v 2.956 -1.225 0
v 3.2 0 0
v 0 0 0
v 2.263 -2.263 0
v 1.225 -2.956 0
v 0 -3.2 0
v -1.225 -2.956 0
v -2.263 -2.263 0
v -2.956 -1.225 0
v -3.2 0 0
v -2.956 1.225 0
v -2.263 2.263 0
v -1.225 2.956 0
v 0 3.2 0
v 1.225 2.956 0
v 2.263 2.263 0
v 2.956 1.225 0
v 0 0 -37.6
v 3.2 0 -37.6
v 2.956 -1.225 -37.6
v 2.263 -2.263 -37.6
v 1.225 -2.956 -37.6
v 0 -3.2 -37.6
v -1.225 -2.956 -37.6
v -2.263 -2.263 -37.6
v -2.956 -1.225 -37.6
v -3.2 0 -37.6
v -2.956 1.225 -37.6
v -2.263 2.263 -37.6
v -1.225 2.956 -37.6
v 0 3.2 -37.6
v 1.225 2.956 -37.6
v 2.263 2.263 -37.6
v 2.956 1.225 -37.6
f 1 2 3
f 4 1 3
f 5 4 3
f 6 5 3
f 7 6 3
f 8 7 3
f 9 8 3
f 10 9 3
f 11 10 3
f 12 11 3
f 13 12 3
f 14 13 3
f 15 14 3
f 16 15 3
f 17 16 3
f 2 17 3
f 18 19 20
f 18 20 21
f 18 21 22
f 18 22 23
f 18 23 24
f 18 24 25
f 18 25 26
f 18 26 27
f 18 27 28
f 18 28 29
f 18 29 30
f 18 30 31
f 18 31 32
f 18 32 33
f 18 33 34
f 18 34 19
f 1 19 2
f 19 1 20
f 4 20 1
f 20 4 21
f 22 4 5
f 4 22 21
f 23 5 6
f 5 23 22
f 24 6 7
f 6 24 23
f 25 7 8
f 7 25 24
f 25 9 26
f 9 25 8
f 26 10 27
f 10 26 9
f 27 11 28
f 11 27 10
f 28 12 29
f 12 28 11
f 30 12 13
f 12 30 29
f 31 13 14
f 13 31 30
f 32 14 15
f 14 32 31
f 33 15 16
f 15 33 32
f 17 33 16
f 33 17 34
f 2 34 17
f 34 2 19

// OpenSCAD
// file: ../p/stud3.scad
use <../lib.scad>
use <4-4cyli.scad>
use <4-4disc.scad>
use <4-4edge.scad>
$fa=1; $fs=0.2;
function ldraw_lib__stud3(realsolid=false) = realsolid ? 
    [openscad(translate([0,0,-eps()], o=cylinder(4+eps(), r=4)),2)] : [
// 0 Stud Tube Solid
// 0 Name: stud3.dat
// 0 Author: James Jessiman
// 0 !LDRAW_ORG Primitive UPDATE 2012-01
// 0 !LICENSE Licensed under CC BY 2.0 and CC BY 4.0 : see CAreadme.txt
// 
// 0 BFC CERTIFY CCW
  [0,"BFC","CERTIFY"],
  [0,"BFC","CCW"],
// 
// 0 !HISTORY 2002-04-04 [sbliss] Modified for BFC compliance
// 0 !HISTORY 2002-04-25 [PTadmin] Official Update 2002-02
// 0 !HISTORY 2007-06-24 [PTadmin] Header formatted for Contributor Agreement
// 0 !HISTORY 2008-07-01 [PTadmin] Official Update 2008-01
// 0 !HISTORY 2012-02-16 [Philo] Changed to CCW
// 0 !HISTORY 2012-03-30 [PTadmin] Official Update 2012-01
// 
// 
// 1 16 0 -4 0 4 0 0 0 1 0 0 0 4 4-4edge.dat
  [1,16,0,-4,0,4,0,0,0,1,0,0,0,4, ldraw_lib__4_4edge(realsolid)],
// 1 16 0 0 0 4 0 0 0 1 0 0 0 4 4-4edge.dat
  [1,16,0,0,0,4,0,0,0,1,0,0,0,4, ldraw_lib__4_4edge(realsolid)],
// 1 16 0 -4 0 4 0 0 0 1 0 0 0 4 4-4disc.dat
  [1,16,0,-4,0,4,0,0,0,1,0,0,0,4, ldraw_lib__4_4disc(realsolid)],
// 1 16 0 -4 0 4 0 0 0 4 0 0 0 4 4-4cyli.dat
  [1,16,0,-4,0,4,0,0,0,4,0,0,0,4, ldraw_lib__4_4cyli(realsolid)],
];
module ldraw_lib__stud3(step=0, col=false, unit=2/5, alt=false, line=0.2, solid=!$preview)
    makepoly(ldraw_lib__stud3(solid), step=step, col=col, unit=unit, alt=alt, line=line, solid=solid);
ldraw_lib__stud3(line=0.2);
// file: ../p/stud.scad
use <../lib.scad>
use <4-4cyli.scad>
use <4-4disc.scad>
use <4-4edge.scad>
$fa=1; $fs=0.2;
function ldraw_lib__stud(realsolid=false) = realsolid ? 
    [openscad(translate([0,0,-eps()], o=cylinder(4+eps(), r=6)),2)] : [
// 0 Stud
// 0 Name: stud.dat
// 0 Author: James Jessiman
// 0 !LDRAW_ORG Primitive UPDATE 2012-01
// 0 !LICENSE Licensed under CC BY 2.0 and CC BY 4.0 : see CAreadme.txt
// 
// 0 BFC CERTIFY CCW
  [0,"BFC","CERTIFY"],
  [0,"BFC","CCW"],
// 
// 0 !HISTORY 2002-04-04 [sbliss] Modified for BFC compliance
// 0 !HISTORY 2002-04-25 [PTadmin] Official Update 2002-02
// 0 !HISTORY 2007-06-24 [PTadmin] Header formatted for Contributor Agreement
// 0 !HISTORY 2008-07-01 [PTadmin] Official Update 2008-01
// 0 !HISTORY 2012-02-16 [Philo] Changed to CCW
// 0 !HISTORY 2012-03-30 [PTadmin] Official Update 2012-01
// 
// 
// 1 16 0 0 0 6 0 0 0 1 0 0 0 6 4-4edge.dat
  [1,16,0,0,0,6,0,0,0,1,0,0,0,6, ldraw_lib__4_4edge(realsolid)],
// 1 16 0 -4 0 6 0 0 0 1 0 0 0 6 4-4edge.dat
  [1,16,0,-4,0,6,0,0,0,1,0,0,0,6, ldraw_lib__4_4edge(realsolid)],
// 1 16 0 0 0 6 0 0 0 -4 0 0 0 6 4-4cyli.dat
  [1,16,0,0,0,6,0,0,0,-4,0,0,0,6, ldraw_lib__4_4cyli(realsolid)],
// 1 16 0 -4 0 6 0 0 0 1 0 0 0 6 4-4disc.dat
  [1,16,0,-4,0,6,0,0,0,1,0,0,0,6, ldraw_lib__4_4disc(realsolid)],
];
module ldraw_lib__stud(step=0, col=false, unit=2/5, alt=false, line=0.2, solid=!$preview)
    makepoly(ldraw_lib__stud(solid), step=step, col=col, unit=unit, alt=alt, line=line, solid=solid);
ldraw_lib__stud(line=0.2);
// file: ../p/box5.scad
use <../lib.scad>
$fa=1; $fs=0.2;
function ldraw_lib__box5(realsolid=false) = [
// 0 Box with 5 Faces and All Edges
// 0 Name: box5.dat
// 0 Author: James Jessiman
// 0 !LDRAW_ORG Primitive UPDATE 2012-01
// 0 !LICENSE Licensed under CC BY 2.0 and CC BY 4.0 : see CAreadme.txt
// 
// 0 BFC CERTIFY CCW
  [0,"BFC","CERTIFY"],
  [0,"BFC","CCW"],
// 
// 0 !HISTORY 2002-04-03 [sbliss] Modified for BFC compliance
// 0 !HISTORY 2002-04-25 [PTadmin] Official Update 2002-02
// 0 !HISTORY 2007-06-24 [PTadmin] Header formatted for Contributor Agreement
// 0 !HISTORY 2008-07-01 [PTadmin] Official Update 2008-01
// 0 !HISTORY 2012-02-16 [Philo] Changed to CCW
// 0 !HISTORY 2012-03-30 [PTadmin] Official Update 2012-01
// 
// 
// 2 24 1 1 1 -1 1 1
  [2,24,1,1,1,-1,1,1],
// 2 24 -1 1 1 -1 1 -1
  [2,24,-1,1,1,-1,1,-1],
// 2 24 -1 1 -1 1 1 -1
  [2,24,-1,1,-1,1,1,-1],
// 2 24 1 1 -1 1 1 1
  [2,24,1,1,-1,1,1,1],
// 2 24 1 0 1 -1 0 1
  [2,24,1,0,1,-1,0,1],
// 2 24 -1 0 1 -1 0 -1
  [2,24,-1,0,1,-1,0,-1],
// 2 24 -1 0 -1 1 0 -1
  [2,24,-1,0,-1,1,0,-1],
// 2 24 1 0 -1 1 0 1
  [2,24,1,0,-1,1,0,1],
// 2 24 1 0 1 1 1 1
  [2,24,1,0,1,1,1,1],
// 2 24 -1 0 1 -1 1 1
  [2,24,-1,0,1,-1,1,1],
// 2 24 1 0 -1 1 1 -1
  [2,24,1,0,-1,1,1,-1],
// 2 24 -1 0 -1 -1 1 -1
  [2,24,-1,0,-1,-1,1,-1],
// 4 16 -1 1 1 1 1 1 1 1 -1 -1 1 -1
  [4,16,-1,1,1,1,1,1,1,1,-1,-1,1,-1],
// 4 16 -1 1 1 -1 0 1 1 0 1 1 1 1
  [4,16,-1,1,1,-1,0,1,1,0,1,1,1,1],
// 4 16 -1 1 -1 -1 0 -1 -1 0 1 -1 1 1
  [4,16,-1,1,-1,-1,0,-1,-1,0,1,-1,1,1],
// 4 16 1 1 -1 1 0 -1 -1 0 -1 -1 1 -1
  [4,16,1,1,-1,1,0,-1,-1,0,-1,-1,1,-1],
// 4 16 1 1 1 1 0 1 1 0 -1 1 1 -1
  [4,16,1,1,1,1,0,1,1,0,-1,1,1,-1],
];
module ldraw_lib__box5(step=0, col=false, unit=2/5, alt=false, line=0.2, solid=!$preview)
    makepoly(ldraw_lib__box5(solid), step=step, col=col, unit=unit, alt=alt, line=line, solid=solid);
ldraw_lib__box5(line=0.2);
// file: ../p/box4t.scad
use <../lib.scad>
$fa=1; $fs=0.2;
function ldraw_lib__box4t(realsolid=false) = [
// 0 Box with 4 Adjacent Faces and All Edges
// 0 Name: box4t.dat
// 0 Author: Tore Eriksson [Tore_Eriksson]
// 0 !LDRAW_ORG Primitive UPDATE 2003-02
// 0 !LICENSE Licensed under CC BY 2.0 and CC BY 4.0 : see CAreadme.txt
// 
// 0 BFC CERTIFY CCW
  [0,"BFC","CERTIFY"],
  [0,"BFC","CCW"],
// 
// 0 !HISTORY 1997-09-29 [PTadmin] Official Update 1997-15
// 0 !HISTORY 2002-08-31 [izanette] Modified with WINDZ for BFC compliance
// 0 !HISTORY 2003-08-01 [PTadmin] Official Update 2003-02
// 0 !HISTORY 2007-06-24 [PTadmin] Header formatted for Contributor Agreement
// 0 !HISTORY 2008-07-01 [PTadmin] Official Update 2008-01
// 
// 
// 2 24 1 1 1 -1 1 1
  [2,24,1,1,1,-1,1,1],
// 2 24 -1 1 1 -1 1 -1
  [2,24,-1,1,1,-1,1,-1],
// 2 24 -1 1 -1 1 1 -1
  [2,24,-1,1,-1,1,1,-1],
// 2 24 1 1 -1 1 1 1
  [2,24,1,1,-1,1,1,1],
// 2 24 1 0 1 -1 0 1
  [2,24,1,0,1,-1,0,1],
// 2 24 -1 0 1 -1 0 -1
  [2,24,-1,0,1,-1,0,-1],
// 2 24 -1 0 -1 1 0 -1
  [2,24,-1,0,-1,1,0,-1],
// 2 24 1 0 -1 1 0 1
  [2,24,1,0,-1,1,0,1],
// 2 24 1 0 1 1 1 1
  [2,24,1,0,1,1,1,1],
// 2 24 -1 0 1 -1 1 1
  [2,24,-1,0,1,-1,1,1],
// 2 24 1 0 -1 1 1 -1
  [2,24,1,0,-1,1,1,-1],
// 2 24 -1 0 -1 -1 1 -1
  [2,24,-1,0,-1,-1,1,-1],
// 4 16 1 1 1 1 1 -1 -1 1 -1 -1 1 1
  [4,16,1,1,1,1,1,-1,-1,1,-1,-1,1,1],
// 4 16 1 1 1 -1 1 1 -1 0 1 1 0 1
  [4,16,1,1,1,-1,1,1,-1,0,1,1,0,1],
// 4 16 -1 1 1 -1 1 -1 -1 0 -1 -1 0 1
  [4,16,-1,1,1,-1,1,-1,-1,0,-1,-1,0,1],
// 0 4 16 -1 1 -1 -1 0 -1 1 0 -1 1 1 -1
// 4 16 1 1 -1 1 1 1 1 0 1 1 0 -1
  [4,16,1,1,-1,1,1,1,1,0,1,1,0,-1],
// 0
];
module ldraw_lib__box4t(step=0, col=false, unit=2/5, alt=false, line=0.2, solid=!$preview)
    makepoly(ldraw_lib__box4t(solid), step=step, col=col, unit=unit, alt=alt, line=line, solid=solid);
ldraw_lib__box4t(line=0.2);
// file: s/3004s01.scad
use <../../lib.scad>
use <../../p/box4t.scad>
use <../../p/box5.scad>
use <../../p/stud.scad>
use <../../p/stud3.scad>
$fa=1; $fs=0.2;
function ldraw_lib__s__3004s01(realsolid=false) = [
// 0 ~Brick  1 x  2 without Front Face
// 0 Name: s\3004s01.dat
// 0 Author: James Jessiman
// 0 !LDRAW_ORG Subpart UPDATE 2003-03
// 0 !LICENSE Licensed under CC BY 2.0 and CC BY 4.0 : see CAreadme.txt
// 
// 0 BFC CERTIFY CCW
  [0,"BFC","CERTIFY"],
  [0,"BFC","CCW"],
// 
// 0 !HISTORY 2003-09-07 [jriley] Subfiling, BFC
// 0 !HISTORY 2003-12-19 [PTadmin] Official Update 2003-03
// 0 !HISTORY 2007-08-29 [PTadmin] Header formatted for Contributor Agreement
// 0 !HISTORY 2008-07-01 [PTadmin] Official Update 2008-01
// 
// 
// 1 16 0 4 0 1 0 0 0 -5 0 0 0 1 stud3.dat
  [1,16,0,4,0,1,0,0,0,-5,0,0,0,1, ldraw_lib__stud3(realsolid)],
// 0 BFC INVERTNEXT
  [0,"BFC","INVERTNEXT"],
// 1 16 0 24 0 16 0 0 0 -20 0 0 0 6 box5.dat
  [1,16,0,24,0,16,0,0,0,-20,0,0,0,6, ldraw_lib__box5(realsolid)],
// 4 16 20 24 10 16 24 6 -16 24 6 -20 24 10
  [4,16,20,24,10,16,24,6,-16,24,6,-20,24,10],
// 4 16 -20 24 10 -16 24 6 -16 24 -6 -20 24 -10
  [4,16,-20,24,10,-16,24,6,-16,24,-6,-20,24,-10],
// 4 16 -20 24 -10 -16 24 -6 16 24 -6 20 24 -10
  [4,16,-20,24,-10,-16,24,-6,16,24,-6,20,24,-10],
// 4 16 20 24 -10 16 24 -6 16 24 6 20 24 10
  [4,16,20,24,-10,16,24,-6,16,24,6,20,24,10],
// 1 16 0 24 0 20 0 0 0 -24 0 0 0 10 box4t.dat
  [1,16,0,24,0,20,0,0,0,-24,0,0,0,10, ldraw_lib__box4t(realsolid)],
// 1 16 10 0 0 1 0 0 0 1 0 0 0 1 stud.dat
  [1,16,10,0,0,1,0,0,0,1,0,0,0,1, ldraw_lib__stud(realsolid)],
// 1 16 -10 0 0 1 0 0 0 1 0 0 0 1 stud.dat
  [1,16,-10,0,0,1,0,0,0,1,0,0,0,1, ldraw_lib__stud(realsolid)],
// 0
];
module ldraw_lib__s__3004s01(step=0, col=false, unit=2/5, alt=false, line=0.2, solid=!$preview)
    makepoly(ldraw_lib__s__3004s01(solid), step=step, col=col, unit=unit, alt=alt, line=line, solid=solid);
ldraw_lib__s__3004s01(line=0.2);
// file: ../p/4-4cyli.scad
use <../lib.scad>
$fa=1; $fs=0.2;
function ldraw_lib__4_4cyli(realsolid=false) = [
// 0 Cylinder 1.0
// 0 Name: 4-4cyli.dat
// 0 Author: James Jessiman
// 0 !LDRAW_ORG Primitive UPDATE 2005-01
// 0 !LICENSE Licensed under CC BY 2.0 and CC BY 4.0 : see CAreadme.txt
// 
// 0 BFC CERTIFY CCW
  [0,"BFC","CERTIFY"],
  [0,"BFC","CCW"],
// 
// 0 !HISTORY 1998-12-15 [PTadmin] Official Update 1998-10
// 0 !HISTORY 2002-03-23 [sbliss] Added BFC statement; merged headers from files in distributions LDraw 0.27 and Complete.
// 0 !HISTORY 2002-04-25 [PTadmin] Official Update 2002-02
// 0 !HISTORY 2004-12-14 [guyvivan] BFC CCW
// 0 !HISTORY 2005-12-28 [PTadmin] Official Update 2005-01
// 0 !HISTORY 2007-06-24 [PTadmin] Header formatted for Contributor Agreement
// 0 !HISTORY 2008-07-01 [PTadmin] Official Update 2008-01
// 
// 
// 4 16 1 1 0 0.9239 1 0.3827 0.9239 0 0.3827 1 0 0
  [4,16,1,1,0,0.9239,1,0.3827,0.9239,0,0.3827,1,0,0],
// 5 24 1 0 0 1 1 0 0.9239 0 0.3827 0.9239 0 -0.3827
  [5,24,1,0,0,1,1,0,0.9239,0,0.3827,0.9239,0,-0.3827],
// 4 16 0.9239 1 0.3827 0.7071 1 0.7071 0.7071 0 0.7071 0.9239 0 0.3827
  [4,16,0.9239,1,0.3827,0.7071,1,0.7071,0.7071,0,0.7071,0.9239,0,0.3827],
// 5 24 0.9239 0 0.3827 0.9239 1 0.3827 0.7071 0 0.7071 1 0 0
  [5,24,0.9239,0,0.3827,0.9239,1,0.3827,0.7071,0,0.7071,1,0,0],
// 4 16 0.7071 1 0.7071 0.3827 1 0.9239 0.3827 0 0.9239 0.7071 0 0.7071
  [4,16,0.7071,1,0.7071,0.3827,1,0.9239,0.3827,0,0.9239,0.7071,0,0.7071],
// 5 24 0.7071 0 0.7071 0.7071 1 0.7071 0.3827 0 0.9239 0.9239 0 0.3827
  [5,24,0.7071,0,0.7071,0.7071,1,0.7071,0.3827,0,0.9239,0.9239,0,0.3827],
// 4 16 0.3827 1 0.9239 0 1 1 0 0 1 0.3827 0 0.9239
  [4,16,0.3827,1,0.9239,0,1,1,0,0,1,0.3827,0,0.9239],
// 5 24 0.3827 0 0.9239 0.3827 1 0.9239 0 0 1 0.7071 0 0.7071
  [5,24,0.3827,0,0.9239,0.3827,1,0.9239,0,0,1,0.7071,0,0.7071],
// 4 16 0 1 1 -0.3827 1 0.9239 -0.3827 0 0.9239 0 0 1
  [4,16,0,1,1,-0.3827,1,0.9239,-0.3827,0,0.9239,0,0,1],
// 5 24 0 0 1 0 1 1 -0.3827 0 0.9239 0.3827 0 0.9239
  [5,24,0,0,1,0,1,1,-0.3827,0,0.9239,0.3827,0,0.9239],
// 4 16 -0.3827 1 0.9239 -0.7071 1 0.7071 -0.7071 0 0.7071 -0.3827 0 0.9239
  [4,16,-0.3827,1,0.9239,-0.7071,1,0.7071,-0.7071,0,0.7071,-0.3827,0,0.9239],
// 5 24 -0.3827 0 0.9239 -0.3827 1 0.9239 -0.7071 0 0.7071 0 0 1
  [5,24,-0.3827,0,0.9239,-0.3827,1,0.9239,-0.7071,0,0.7071,0,0,1],
// 4 16 -0.7071 1 0.7071 -0.9239 1 0.3827 -0.9239 0 0.3827 -0.7071 0 0.7071
  [4,16,-0.7071,1,0.7071,-0.9239,1,0.3827,-0.9239,0,0.3827,-0.7071,0,0.7071],
// 5 24 -0.7071 0 0.7071 -0.7071 1 0.7071 -0.9239 0 0.3827 -0.3827 0 0.9239
  [5,24,-0.7071,0,0.7071,-0.7071,1,0.7071,-0.9239,0,0.3827,-0.3827,0,0.9239],
// 4 16 -0.9239 1 0.3827 -1 1 0 -1 0 0 -0.9239 0 0.3827
  [4,16,-0.9239,1,0.3827,-1,1,0,-1,0,0,-0.9239,0,0.3827],
// 5 24 -0.9239 0 0.3827 -0.9239 1 0.3827 -1 0 0 -0.7071 0 0.7071
  [5,24,-0.9239,0,0.3827,-0.9239,1,0.3827,-1,0,0,-0.7071,0,0.7071],
// 4 16 -1 1 0 -0.9239 1 -0.3827 -0.9239 0 -0.3827 -1 0 0
  [4,16,-1,1,0,-0.9239,1,-0.3827,-0.9239,0,-0.3827,-1,0,0],
// 5 24 -1 0 0 -1 1 0 -0.9239 0 -0.3827 -0.9239 0 0.3827
  [5,24,-1,0,0,-1,1,0,-0.9239,0,-0.3827,-0.9239,0,0.3827],
// 4 16 -0.9239 1 -0.3827 -0.7071 1 -0.7071 -0.7071 0 -0.7071 -0.9239 0 -0.3827
  [4,16,-0.9239,1,-0.3827,-0.7071,1,-0.7071,-0.7071,0,-0.7071,-0.9239,0,-0.3827],
// 5 24 -0.9239 0 -0.3827 -0.9239 1 -0.3827 -0.7071 0 -0.7071 -1 0 0
  [5,24,-0.9239,0,-0.3827,-0.9239,1,-0.3827,-0.7071,0,-0.7071,-1,0,0],
// 4 16 -0.7071 1 -0.7071 -0.3827 1 -0.9239 -0.3827 0 -0.9239 -0.7071 0 -0.7071
  [4,16,-0.7071,1,-0.7071,-0.3827,1,-0.9239,-0.3827,0,-0.9239,-0.7071,0,-0.7071],
// 5 24 -0.7071 0 -0.7071 -0.7071 1 -0.7071 -0.3827 0 -0.9239 -0.9239 0 -0.3827
  [5,24,-0.7071,0,-0.7071,-0.7071,1,-0.7071,-0.3827,0,-0.9239,-0.9239,0,-0.3827],
// 4 16 -0.3827 1 -0.9239 0 1 -1 0 0 -1 -0.3827 0 -0.9239
  [4,16,-0.3827,1,-0.9239,0,1,-1,0,0,-1,-0.3827,0,-0.9239],
// 5 24 -0.3827 0 -0.9239 -0.3827 1 -0.9239 0 0 -1 -0.7071 0 -0.7071
  [5,24,-0.3827,0,-0.9239,-0.3827,1,-0.9239,0,0,-1,-0.7071,0,-0.7071],
// 4 16 0 1 -1 0.3827 1 -0.9239 0.3827 0 -0.9239 0 0 -1
  [4,16,0,1,-1,0.3827,1,-0.9239,0.3827,0,-0.9239,0,0,-1],
// 5 24 0 0 -1 0 1 -1 0.3827 0 -0.9239 -0.3827 0 -0.9239
  [5,24,0,0,-1,0,1,-1,0.3827,0,-0.9239,-0.3827,0,-0.9239],
// 4 16 0.3827 1 -0.9239 0.7071 1 -0.7071 0.7071 0 -0.7071 0.3827 0 -0.9239
  [4,16,0.3827,1,-0.9239,0.7071,1,-0.7071,0.7071,0,-0.7071,0.3827,0,-0.9239],
// 5 24 0.3827 0 -0.9239 0.3827 1 -0.9239 0.7071 0 -0.7071 0 0 -1
  [5,24,0.3827,0,-0.9239,0.3827,1,-0.9239,0.7071,0,-0.7071,0,0,-1],
// 4 16 0.7071 1 -0.7071 0.9239 1 -0.3827 0.9239 0 -0.3827 0.7071 0 -0.7071
  [4,16,0.7071,1,-0.7071,0.9239,1,-0.3827,0.9239,0,-0.3827,0.7071,0,-0.7071],
// 5 24 0.7071 0 -0.7071 0.7071 1 -0.7071 0.9239 0 -0.3827 0.3827 0 -0.9239
  [5,24,0.7071,0,-0.7071,0.7071,1,-0.7071,0.9239,0,-0.3827,0.3827,0,-0.9239],
// 4 16 0.9239 1 -0.3827 1 1 0 1 0 0 0.9239 0 -0.3827
  [4,16,0.9239,1,-0.3827,1,1,0,1,0,0,0.9239,0,-0.3827],
// 5 24 0.9239 0 -0.3827 0.9239 1 -0.3827 1 0 0 0.7071 0 -0.7071
  [5,24,0.9239,0,-0.3827,0.9239,1,-0.3827,1,0,0,0.7071,0,-0.7071],
// 0
];
module ldraw_lib__4_4cyli(step=0, col=false, unit=2/5, alt=false, line=0.2, solid=!$preview)
    makepoly(ldraw_lib__4_4cyli(solid), step=step, col=col, unit=unit, alt=alt, line=line, solid=solid);
ldraw_lib__4_4cyli(line=0.2);
// file: 3004.scad
use <../lib.scad>
use <s/3004s01.scad>
$fa=1; $fs=0.2;
function ldraw_lib__3004(realsolid=false) = [
// 0 Brick  1 x  2
// 0 Name: 3004.dat
// 0 Author: James Jessiman
// 0 !LDRAW_ORG Part UPDATE 2022-05
// 0 !LICENSE Licensed under CC BY 2.0 and CC BY 4.0 : see CAreadme.txt
// 
// 0 BFC CERTIFY CCW
  [0,"BFC","CERTIFY"],
  [0,"BFC","CCW"],
// 
// 0 !HISTORY 2001-10-26 [PTadmin] Official Update 2001-01
// 0 !HISTORY 2002-05-07 {unknown} BFC Certification
// 0 !HISTORY 2002-06-11 [PTadmin] Official Update 2002-03
// 0 !HISTORY 2007-05-07 [PTadmin] Header formatted for Contributor Agreement
// 0 !HISTORY 2008-07-01 [PTadmin] Official Update 2008-01
// 0 !HISTORY 2022-08-04 [MagFors] Using subfile
// 0 !HISTORY 2022-09-15 [PTadmin] Official Update 2022-05
// 
// 
// 1 16 0 0 0 1 0 0 0 1 0 0 0 1 s\3004s01.dat
  [1,16,0,0,0,1,0,0,0,1,0,0,0,1, ldraw_lib__s__3004s01(realsolid)],
// 4 16 -20 24 -10 20 24 -10 20 0 -10 -20 0 -10
  [4,16,-20,24,-10,20,24,-10,20,0,-10,-20,0,-10],
];
module ldraw_lib__3004(step=0, col=false, unit=2/5, alt=false, line=0.2, solid=!$preview)
    makepoly(ldraw_lib__3004(solid), step=step, col=col, unit=unit, alt=alt, line=line, solid=solid);
ldraw_lib__3004(line=0.2);
// file: ../p/4-4edge.scad
use <../lib.scad>
$fa=1; $fs=0.2;
function ldraw_lib__4_4edge(realsolid=false) = [
// 0 Circle 1.0
// 0 Name: 4-4edge.dat
// 0 Author: James Jessiman
// 0 !LDRAW_ORG Primitive UPDATE 2017-01
// 0 !LICENSE Licensed under CC BY 2.0 and CC BY 4.0 : see CAreadme.txt
// 
// 0 BFC CERTIFY CCW
  [0,"BFC","CERTIFY"],
  [0,"BFC","CCW"],
// 
// 0 !HISTORY 1998-12-15 [PTadmin] Official Update 1998-10
// 0 !HISTORY 2005-12-28 [PTadmin] Official Update 2005-01
// 0 !HISTORY 2007-06-24 [PTadmin] Header formatted for Contributor Agreement
// 0 !HISTORY 2008-07-01 [PTadmin] Official Update 2008-01
// 0 !HISTORY 2017-01-15 [Steffen] BFCed
// 0 !HISTORY 2017-12-30 [PTadmin] Official Update 2017-01
// 
// 
// 2 24 1 0 0 0.9239 0 0.3827
  [2,24,1,0,0,0.9239,0,0.3827],
// 2 24 0.9239 0 0.3827 0.7071 0 0.7071
  [2,24,0.9239,0,0.3827,0.7071,0,0.7071],
// 2 24 0.7071 0 0.7071 0.3827 0 0.9239
  [2,24,0.7071,0,0.7071,0.3827,0,0.9239],
// 2 24 0.3827 0 0.9239 0 0 1
  [2,24,0.3827,0,0.9239,0,0,1],
// 2 24 0 0 1 -0.3827 0 0.9239
  [2,24,0,0,1,-0.3827,0,0.9239],
// 2 24 -0.3827 0 0.9239 -0.7071 0 0.7071
  [2,24,-0.3827,0,0.9239,-0.7071,0,0.7071],
// 2 24 -0.7071 0 0.7071 -0.9239 0 0.3827
  [2,24,-0.7071,0,0.7071,-0.9239,0,0.3827],
// 2 24 -0.9239 0 0.3827 -1 0 -0
  [2,24,-0.9239,0,0.3827,-1,0,-0],
// 2 24 -1 0 -0 -0.9239 0 -0.3827
  [2,24,-1,0,-0,-0.9239,0,-0.3827],
// 2 24 -0.9239 0 -0.3827 -0.7071 0 -0.7071
  [2,24,-0.9239,0,-0.3827,-0.7071,0,-0.7071],
// 2 24 -0.7071 0 -0.7071 -0.3827 0 -0.9239
  [2,24,-0.7071,0,-0.7071,-0.3827,0,-0.9239],
// 2 24 -0.3827 0 -0.9239 0 0 -1
  [2,24,-0.3827,0,-0.9239,0,0,-1],
// 2 24 0 0 -1 0.3827 0 -0.9239
  [2,24,0,0,-1,0.3827,0,-0.9239],
// 2 24 0.3827 0 -0.9239 0.7071 0 -0.7071
  [2,24,0.3827,0,-0.9239,0.7071,0,-0.7071],
// 2 24 0.7071 0 -0.7071 0.9239 0 -0.3827
  [2,24,0.7071,0,-0.7071,0.9239,0,-0.3827],
// 2 24 0.9239 0 -0.3827 1 0 0
  [2,24,0.9239,0,-0.3827,1,0,0],
];
module ldraw_lib__4_4edge(step=0, col=false, unit=2/5, alt=false, line=0.2, solid=!$preview)
    makepoly(ldraw_lib__4_4edge(solid), step=step, col=col, unit=unit, alt=alt, line=line, solid=solid);
ldraw_lib__4_4edge(line=0.2);
// file: ../p/4-4disc.scad
use <../lib.scad>
$fa=1; $fs=0.2;
function ldraw_lib__4_4disc(realsolid=false) = [
// 0 Disc 1.0
// 0 Name: 4-4disc.dat
// 0 Author: James Jessiman
// 0 !LDRAW_ORG Primitive UPDATE 2002-02
// 0 !LICENSE Licensed under CC BY 2.0 and CC BY 4.0 : see CAreadme.txt
// 
// 0 BFC CERTIFY CCW
  [0,"BFC","CERTIFY"],
  [0,"BFC","CCW"],
// 
// 0 !HISTORY 1998-12-15 [PTadmin] Official Update 1998-10
// 0 !HISTORY 2002-03-23 [sbliss] Added BFC statement
// 0 !HISTORY 2002-04-25 [PTadmin] Official Update 2002-02
// 0 !HISTORY 2007-06-24 [PTadmin] Header formatted for Contributor Agreement
// 0 !HISTORY 2008-07-01 [PTadmin] Official Update 2008-01
// 
// 
// 3 16 0 0 0 1 0 0 0.9239 0 0.3827
  [3,16,0,0,0,1,0,0,0.9239,0,0.3827],
// 3 16 0 0 0 0.9239 0 0.3827 0.7071 0 0.7071
  [3,16,0,0,0,0.9239,0,0.3827,0.7071,0,0.7071],
// 3 16 0 0 0 0.7071 0 0.7071 0.3827 0 0.9239
  [3,16,0,0,0,0.7071,0,0.7071,0.3827,0,0.9239],
// 3 16 0 0 0 0.3827 0 0.9239 0 0 1
  [3,16,0,0,0,0.3827,0,0.9239,0,0,1],
// 3 16 0 0 0 0 0 1 -0.3827 0 0.9239
  [3,16,0,0,0,0,0,1,-0.3827,0,0.9239],
// 3 16 0 0 0 -0.3827 0 0.9239 -0.7071 0 0.7071
  [3,16,0,0,0,-0.3827,0,0.9239,-0.7071,0,0.7071],
// 3 16 0 0 0 -0.7071 0 0.7071 -0.9239 0 0.3827
  [3,16,0,0,0,-0.7071,0,0.7071,-0.9239,0,0.3827],
// 3 16 0 0 0 -0.9239 0 0.3827 -1 0 -0
  [3,16,0,0,0,-0.9239,0,0.3827,-1,0,-0],
// 3 16 0 0 0 -1 0 -0 -0.9239 0 -0.3827
  [3,16,0,0,0,-1,0,-0,-0.9239,0,-0.3827],
// 3 16 0 0 0 -0.9239 0 -0.3827 -0.7071 0 -0.7071
  [3,16,0,0,0,-0.9239,0,-0.3827,-0.7071,0,-0.7071],
// 3 16 0 0 0 -0.7071 0 -0.7071 -0.3827 0 -0.9239
  [3,16,0,0,0,-0.7071,0,-0.7071,-0.3827,0,-0.9239],
// 3 16 0 0 0 -0.3827 0 -0.9239 0 0 -1
  [3,16,0,0,0,-0.3827,0,-0.9239,0,0,-1],
// 3 16 0 0 0 0 0 -1 0.3827 0 -0.9239
  [3,16,0,0,0,0,0,-1,0.3827,0,-0.9239],
// 3 16 0 0 0 0.3827 0 -0.9239 0.7071 0 -0.7071
  [3,16,0,0,0,0.3827,0,-0.9239,0.7071,0,-0.7071],
// 3 16 0 0 0 0.7071 0 -0.7071 0.9239 0 -0.3827
  [3,16,0,0,0,0.7071,0,-0.7071,0.9239,0,-0.3827],
// 3 16 0 0 0 0.9239 0 -0.3827 1 0 0
  [3,16,0,0,0,0.9239,0,-0.3827,1,0,0],
// 0
];
module ldraw_lib__4_4disc(step=0, col=false, unit=2/5, alt=false, line=0.2, solid=!$preview)
    makepoly(ldraw_lib__4_4disc(solid), step=step, col=col, unit=unit, alt=alt, line=line, solid=solid);
ldraw_lib__4_4disc(line=0.2);
// file: ../p/4-4cylc.scad
use <../lib.scad>
use <4-4cyli.scad>
use <4-4disc.scad>
use <4-4edge.scad>
$fa=1; $fs=0.2;
function ldraw_lib__4_4cylc(realsolid=false) = [
// 0 Cylinder Closed 1.0
// 0 Name: 4-4cylc.dat
// 0 Author: Alex Taylor [anathema]
// 0 !LDRAW_ORG Primitive UPDATE 2009-02
// 0 !LICENSE Licensed under CC BY 2.0 and CC BY 4.0 : see CAreadme.txt
// 
// 0 BFC CERTIFY CCW
  [0,"BFC","CERTIFY"],
  [0,"BFC","CCW"],
// 
// 0 !HISTORY 2008-12-29 [cwdee] Removed one disc
// 0 !HISTORY 2009-09-03 [PTadmin] Official Update 2009-02
// 
// 
// 1 16 0 0 0 1 0 0 0 1 0 0 0 1 4-4edge.dat
  [1,16,0,0,0,1,0,0,0,1,0,0,0,1, ldraw_lib__4_4edge(realsolid)],
// 1 16 0 1 0 1 0 0 0 1 0 0 0 1 4-4edge.dat
  [1,16,0,1,0,1,0,0,0,1,0,0,0,1, ldraw_lib__4_4edge(realsolid)],
// 1 16 0 0 0 1 0 0 0 1 0 0 0 1 4-4disc.dat
  [1,16,0,0,0,1,0,0,0,1,0,0,0,1, ldraw_lib__4_4disc(realsolid)],
// 1 16 0 0 0 1 0 0 0 1 0 0 0 1 4-4cyli.dat
  [1,16,0,0,0,1,0,0,0,1,0,0,0,1, ldraw_lib__4_4cyli(realsolid)],
// 0
];
module ldraw_lib__4_4cylc(step=0, col=false, unit=2/5, alt=false, line=0.2, solid=!$preview)
    makepoly(ldraw_lib__4_4cylc(solid), step=step, col=col, unit=unit, alt=alt, line=line, solid=solid);
ldraw_lib__4_4cylc(line=0.2);
// main file
use <../lib.scad>
use <../p/4-4cylc.scad>
use <../p/4-4disc.scad>
use <../p/4-4edge.scad>
$fa=1; $fs=0.2;
function ldraw_lib__48917(realsolid=false) = [
// 0 ~Technic Shock Absorber 11L/9L Piston
// 0 Name: 48917.dat
// 0 Author: Guy Vivan [guyvivan]
// 0 !LDRAW_ORG Part UPDATE 2012-02
// 0 !LICENSE Licensed under CC BY 2.0 and CC BY 4.0 : see CAreadme.txt
// 
// 0 BFC CERTIFY CCW
  [0,"BFC","CERTIFY"],
  [0,"BFC","CCW"],
// 
// 0 !HISTORY 2012-08-09 [PTadmin] Official Update 2012-02
// 
// 
// 1 16 0 0 0 8 0 0 0 1 0 0 0 -8 4-4disc.dat
  [1,16,0,0,0,8,0,0,0,1,0,0,0,-8, ldraw_lib__4_4disc(realsolid)],
// 1 16 0 0 0 8 0 0 0 1 0 0 0 -8 4-4edge.dat
  [1,16,0,0,0,8,0,0,0,1,0,0,0,-8, ldraw_lib__4_4edge(realsolid)],
// 1 16 0 94 0 8 0 0 0 -94 0 0 0 -8 4-4cylc.dat
  [1,16,0,94,0,8,0,0,0,-94,0,0,0,-8, ldraw_lib__4_4cylc(realsolid)],
];
module ldraw_lib__48917(step=0, col=false, unit=2/5, alt=false, line=0.2, solid=!$preview)
    makepoly(ldraw_lib__48917(solid), step=step, col=col, unit=unit, alt=alt, line=line, solid=solid);
ldraw_lib__48917(line=0.2);
